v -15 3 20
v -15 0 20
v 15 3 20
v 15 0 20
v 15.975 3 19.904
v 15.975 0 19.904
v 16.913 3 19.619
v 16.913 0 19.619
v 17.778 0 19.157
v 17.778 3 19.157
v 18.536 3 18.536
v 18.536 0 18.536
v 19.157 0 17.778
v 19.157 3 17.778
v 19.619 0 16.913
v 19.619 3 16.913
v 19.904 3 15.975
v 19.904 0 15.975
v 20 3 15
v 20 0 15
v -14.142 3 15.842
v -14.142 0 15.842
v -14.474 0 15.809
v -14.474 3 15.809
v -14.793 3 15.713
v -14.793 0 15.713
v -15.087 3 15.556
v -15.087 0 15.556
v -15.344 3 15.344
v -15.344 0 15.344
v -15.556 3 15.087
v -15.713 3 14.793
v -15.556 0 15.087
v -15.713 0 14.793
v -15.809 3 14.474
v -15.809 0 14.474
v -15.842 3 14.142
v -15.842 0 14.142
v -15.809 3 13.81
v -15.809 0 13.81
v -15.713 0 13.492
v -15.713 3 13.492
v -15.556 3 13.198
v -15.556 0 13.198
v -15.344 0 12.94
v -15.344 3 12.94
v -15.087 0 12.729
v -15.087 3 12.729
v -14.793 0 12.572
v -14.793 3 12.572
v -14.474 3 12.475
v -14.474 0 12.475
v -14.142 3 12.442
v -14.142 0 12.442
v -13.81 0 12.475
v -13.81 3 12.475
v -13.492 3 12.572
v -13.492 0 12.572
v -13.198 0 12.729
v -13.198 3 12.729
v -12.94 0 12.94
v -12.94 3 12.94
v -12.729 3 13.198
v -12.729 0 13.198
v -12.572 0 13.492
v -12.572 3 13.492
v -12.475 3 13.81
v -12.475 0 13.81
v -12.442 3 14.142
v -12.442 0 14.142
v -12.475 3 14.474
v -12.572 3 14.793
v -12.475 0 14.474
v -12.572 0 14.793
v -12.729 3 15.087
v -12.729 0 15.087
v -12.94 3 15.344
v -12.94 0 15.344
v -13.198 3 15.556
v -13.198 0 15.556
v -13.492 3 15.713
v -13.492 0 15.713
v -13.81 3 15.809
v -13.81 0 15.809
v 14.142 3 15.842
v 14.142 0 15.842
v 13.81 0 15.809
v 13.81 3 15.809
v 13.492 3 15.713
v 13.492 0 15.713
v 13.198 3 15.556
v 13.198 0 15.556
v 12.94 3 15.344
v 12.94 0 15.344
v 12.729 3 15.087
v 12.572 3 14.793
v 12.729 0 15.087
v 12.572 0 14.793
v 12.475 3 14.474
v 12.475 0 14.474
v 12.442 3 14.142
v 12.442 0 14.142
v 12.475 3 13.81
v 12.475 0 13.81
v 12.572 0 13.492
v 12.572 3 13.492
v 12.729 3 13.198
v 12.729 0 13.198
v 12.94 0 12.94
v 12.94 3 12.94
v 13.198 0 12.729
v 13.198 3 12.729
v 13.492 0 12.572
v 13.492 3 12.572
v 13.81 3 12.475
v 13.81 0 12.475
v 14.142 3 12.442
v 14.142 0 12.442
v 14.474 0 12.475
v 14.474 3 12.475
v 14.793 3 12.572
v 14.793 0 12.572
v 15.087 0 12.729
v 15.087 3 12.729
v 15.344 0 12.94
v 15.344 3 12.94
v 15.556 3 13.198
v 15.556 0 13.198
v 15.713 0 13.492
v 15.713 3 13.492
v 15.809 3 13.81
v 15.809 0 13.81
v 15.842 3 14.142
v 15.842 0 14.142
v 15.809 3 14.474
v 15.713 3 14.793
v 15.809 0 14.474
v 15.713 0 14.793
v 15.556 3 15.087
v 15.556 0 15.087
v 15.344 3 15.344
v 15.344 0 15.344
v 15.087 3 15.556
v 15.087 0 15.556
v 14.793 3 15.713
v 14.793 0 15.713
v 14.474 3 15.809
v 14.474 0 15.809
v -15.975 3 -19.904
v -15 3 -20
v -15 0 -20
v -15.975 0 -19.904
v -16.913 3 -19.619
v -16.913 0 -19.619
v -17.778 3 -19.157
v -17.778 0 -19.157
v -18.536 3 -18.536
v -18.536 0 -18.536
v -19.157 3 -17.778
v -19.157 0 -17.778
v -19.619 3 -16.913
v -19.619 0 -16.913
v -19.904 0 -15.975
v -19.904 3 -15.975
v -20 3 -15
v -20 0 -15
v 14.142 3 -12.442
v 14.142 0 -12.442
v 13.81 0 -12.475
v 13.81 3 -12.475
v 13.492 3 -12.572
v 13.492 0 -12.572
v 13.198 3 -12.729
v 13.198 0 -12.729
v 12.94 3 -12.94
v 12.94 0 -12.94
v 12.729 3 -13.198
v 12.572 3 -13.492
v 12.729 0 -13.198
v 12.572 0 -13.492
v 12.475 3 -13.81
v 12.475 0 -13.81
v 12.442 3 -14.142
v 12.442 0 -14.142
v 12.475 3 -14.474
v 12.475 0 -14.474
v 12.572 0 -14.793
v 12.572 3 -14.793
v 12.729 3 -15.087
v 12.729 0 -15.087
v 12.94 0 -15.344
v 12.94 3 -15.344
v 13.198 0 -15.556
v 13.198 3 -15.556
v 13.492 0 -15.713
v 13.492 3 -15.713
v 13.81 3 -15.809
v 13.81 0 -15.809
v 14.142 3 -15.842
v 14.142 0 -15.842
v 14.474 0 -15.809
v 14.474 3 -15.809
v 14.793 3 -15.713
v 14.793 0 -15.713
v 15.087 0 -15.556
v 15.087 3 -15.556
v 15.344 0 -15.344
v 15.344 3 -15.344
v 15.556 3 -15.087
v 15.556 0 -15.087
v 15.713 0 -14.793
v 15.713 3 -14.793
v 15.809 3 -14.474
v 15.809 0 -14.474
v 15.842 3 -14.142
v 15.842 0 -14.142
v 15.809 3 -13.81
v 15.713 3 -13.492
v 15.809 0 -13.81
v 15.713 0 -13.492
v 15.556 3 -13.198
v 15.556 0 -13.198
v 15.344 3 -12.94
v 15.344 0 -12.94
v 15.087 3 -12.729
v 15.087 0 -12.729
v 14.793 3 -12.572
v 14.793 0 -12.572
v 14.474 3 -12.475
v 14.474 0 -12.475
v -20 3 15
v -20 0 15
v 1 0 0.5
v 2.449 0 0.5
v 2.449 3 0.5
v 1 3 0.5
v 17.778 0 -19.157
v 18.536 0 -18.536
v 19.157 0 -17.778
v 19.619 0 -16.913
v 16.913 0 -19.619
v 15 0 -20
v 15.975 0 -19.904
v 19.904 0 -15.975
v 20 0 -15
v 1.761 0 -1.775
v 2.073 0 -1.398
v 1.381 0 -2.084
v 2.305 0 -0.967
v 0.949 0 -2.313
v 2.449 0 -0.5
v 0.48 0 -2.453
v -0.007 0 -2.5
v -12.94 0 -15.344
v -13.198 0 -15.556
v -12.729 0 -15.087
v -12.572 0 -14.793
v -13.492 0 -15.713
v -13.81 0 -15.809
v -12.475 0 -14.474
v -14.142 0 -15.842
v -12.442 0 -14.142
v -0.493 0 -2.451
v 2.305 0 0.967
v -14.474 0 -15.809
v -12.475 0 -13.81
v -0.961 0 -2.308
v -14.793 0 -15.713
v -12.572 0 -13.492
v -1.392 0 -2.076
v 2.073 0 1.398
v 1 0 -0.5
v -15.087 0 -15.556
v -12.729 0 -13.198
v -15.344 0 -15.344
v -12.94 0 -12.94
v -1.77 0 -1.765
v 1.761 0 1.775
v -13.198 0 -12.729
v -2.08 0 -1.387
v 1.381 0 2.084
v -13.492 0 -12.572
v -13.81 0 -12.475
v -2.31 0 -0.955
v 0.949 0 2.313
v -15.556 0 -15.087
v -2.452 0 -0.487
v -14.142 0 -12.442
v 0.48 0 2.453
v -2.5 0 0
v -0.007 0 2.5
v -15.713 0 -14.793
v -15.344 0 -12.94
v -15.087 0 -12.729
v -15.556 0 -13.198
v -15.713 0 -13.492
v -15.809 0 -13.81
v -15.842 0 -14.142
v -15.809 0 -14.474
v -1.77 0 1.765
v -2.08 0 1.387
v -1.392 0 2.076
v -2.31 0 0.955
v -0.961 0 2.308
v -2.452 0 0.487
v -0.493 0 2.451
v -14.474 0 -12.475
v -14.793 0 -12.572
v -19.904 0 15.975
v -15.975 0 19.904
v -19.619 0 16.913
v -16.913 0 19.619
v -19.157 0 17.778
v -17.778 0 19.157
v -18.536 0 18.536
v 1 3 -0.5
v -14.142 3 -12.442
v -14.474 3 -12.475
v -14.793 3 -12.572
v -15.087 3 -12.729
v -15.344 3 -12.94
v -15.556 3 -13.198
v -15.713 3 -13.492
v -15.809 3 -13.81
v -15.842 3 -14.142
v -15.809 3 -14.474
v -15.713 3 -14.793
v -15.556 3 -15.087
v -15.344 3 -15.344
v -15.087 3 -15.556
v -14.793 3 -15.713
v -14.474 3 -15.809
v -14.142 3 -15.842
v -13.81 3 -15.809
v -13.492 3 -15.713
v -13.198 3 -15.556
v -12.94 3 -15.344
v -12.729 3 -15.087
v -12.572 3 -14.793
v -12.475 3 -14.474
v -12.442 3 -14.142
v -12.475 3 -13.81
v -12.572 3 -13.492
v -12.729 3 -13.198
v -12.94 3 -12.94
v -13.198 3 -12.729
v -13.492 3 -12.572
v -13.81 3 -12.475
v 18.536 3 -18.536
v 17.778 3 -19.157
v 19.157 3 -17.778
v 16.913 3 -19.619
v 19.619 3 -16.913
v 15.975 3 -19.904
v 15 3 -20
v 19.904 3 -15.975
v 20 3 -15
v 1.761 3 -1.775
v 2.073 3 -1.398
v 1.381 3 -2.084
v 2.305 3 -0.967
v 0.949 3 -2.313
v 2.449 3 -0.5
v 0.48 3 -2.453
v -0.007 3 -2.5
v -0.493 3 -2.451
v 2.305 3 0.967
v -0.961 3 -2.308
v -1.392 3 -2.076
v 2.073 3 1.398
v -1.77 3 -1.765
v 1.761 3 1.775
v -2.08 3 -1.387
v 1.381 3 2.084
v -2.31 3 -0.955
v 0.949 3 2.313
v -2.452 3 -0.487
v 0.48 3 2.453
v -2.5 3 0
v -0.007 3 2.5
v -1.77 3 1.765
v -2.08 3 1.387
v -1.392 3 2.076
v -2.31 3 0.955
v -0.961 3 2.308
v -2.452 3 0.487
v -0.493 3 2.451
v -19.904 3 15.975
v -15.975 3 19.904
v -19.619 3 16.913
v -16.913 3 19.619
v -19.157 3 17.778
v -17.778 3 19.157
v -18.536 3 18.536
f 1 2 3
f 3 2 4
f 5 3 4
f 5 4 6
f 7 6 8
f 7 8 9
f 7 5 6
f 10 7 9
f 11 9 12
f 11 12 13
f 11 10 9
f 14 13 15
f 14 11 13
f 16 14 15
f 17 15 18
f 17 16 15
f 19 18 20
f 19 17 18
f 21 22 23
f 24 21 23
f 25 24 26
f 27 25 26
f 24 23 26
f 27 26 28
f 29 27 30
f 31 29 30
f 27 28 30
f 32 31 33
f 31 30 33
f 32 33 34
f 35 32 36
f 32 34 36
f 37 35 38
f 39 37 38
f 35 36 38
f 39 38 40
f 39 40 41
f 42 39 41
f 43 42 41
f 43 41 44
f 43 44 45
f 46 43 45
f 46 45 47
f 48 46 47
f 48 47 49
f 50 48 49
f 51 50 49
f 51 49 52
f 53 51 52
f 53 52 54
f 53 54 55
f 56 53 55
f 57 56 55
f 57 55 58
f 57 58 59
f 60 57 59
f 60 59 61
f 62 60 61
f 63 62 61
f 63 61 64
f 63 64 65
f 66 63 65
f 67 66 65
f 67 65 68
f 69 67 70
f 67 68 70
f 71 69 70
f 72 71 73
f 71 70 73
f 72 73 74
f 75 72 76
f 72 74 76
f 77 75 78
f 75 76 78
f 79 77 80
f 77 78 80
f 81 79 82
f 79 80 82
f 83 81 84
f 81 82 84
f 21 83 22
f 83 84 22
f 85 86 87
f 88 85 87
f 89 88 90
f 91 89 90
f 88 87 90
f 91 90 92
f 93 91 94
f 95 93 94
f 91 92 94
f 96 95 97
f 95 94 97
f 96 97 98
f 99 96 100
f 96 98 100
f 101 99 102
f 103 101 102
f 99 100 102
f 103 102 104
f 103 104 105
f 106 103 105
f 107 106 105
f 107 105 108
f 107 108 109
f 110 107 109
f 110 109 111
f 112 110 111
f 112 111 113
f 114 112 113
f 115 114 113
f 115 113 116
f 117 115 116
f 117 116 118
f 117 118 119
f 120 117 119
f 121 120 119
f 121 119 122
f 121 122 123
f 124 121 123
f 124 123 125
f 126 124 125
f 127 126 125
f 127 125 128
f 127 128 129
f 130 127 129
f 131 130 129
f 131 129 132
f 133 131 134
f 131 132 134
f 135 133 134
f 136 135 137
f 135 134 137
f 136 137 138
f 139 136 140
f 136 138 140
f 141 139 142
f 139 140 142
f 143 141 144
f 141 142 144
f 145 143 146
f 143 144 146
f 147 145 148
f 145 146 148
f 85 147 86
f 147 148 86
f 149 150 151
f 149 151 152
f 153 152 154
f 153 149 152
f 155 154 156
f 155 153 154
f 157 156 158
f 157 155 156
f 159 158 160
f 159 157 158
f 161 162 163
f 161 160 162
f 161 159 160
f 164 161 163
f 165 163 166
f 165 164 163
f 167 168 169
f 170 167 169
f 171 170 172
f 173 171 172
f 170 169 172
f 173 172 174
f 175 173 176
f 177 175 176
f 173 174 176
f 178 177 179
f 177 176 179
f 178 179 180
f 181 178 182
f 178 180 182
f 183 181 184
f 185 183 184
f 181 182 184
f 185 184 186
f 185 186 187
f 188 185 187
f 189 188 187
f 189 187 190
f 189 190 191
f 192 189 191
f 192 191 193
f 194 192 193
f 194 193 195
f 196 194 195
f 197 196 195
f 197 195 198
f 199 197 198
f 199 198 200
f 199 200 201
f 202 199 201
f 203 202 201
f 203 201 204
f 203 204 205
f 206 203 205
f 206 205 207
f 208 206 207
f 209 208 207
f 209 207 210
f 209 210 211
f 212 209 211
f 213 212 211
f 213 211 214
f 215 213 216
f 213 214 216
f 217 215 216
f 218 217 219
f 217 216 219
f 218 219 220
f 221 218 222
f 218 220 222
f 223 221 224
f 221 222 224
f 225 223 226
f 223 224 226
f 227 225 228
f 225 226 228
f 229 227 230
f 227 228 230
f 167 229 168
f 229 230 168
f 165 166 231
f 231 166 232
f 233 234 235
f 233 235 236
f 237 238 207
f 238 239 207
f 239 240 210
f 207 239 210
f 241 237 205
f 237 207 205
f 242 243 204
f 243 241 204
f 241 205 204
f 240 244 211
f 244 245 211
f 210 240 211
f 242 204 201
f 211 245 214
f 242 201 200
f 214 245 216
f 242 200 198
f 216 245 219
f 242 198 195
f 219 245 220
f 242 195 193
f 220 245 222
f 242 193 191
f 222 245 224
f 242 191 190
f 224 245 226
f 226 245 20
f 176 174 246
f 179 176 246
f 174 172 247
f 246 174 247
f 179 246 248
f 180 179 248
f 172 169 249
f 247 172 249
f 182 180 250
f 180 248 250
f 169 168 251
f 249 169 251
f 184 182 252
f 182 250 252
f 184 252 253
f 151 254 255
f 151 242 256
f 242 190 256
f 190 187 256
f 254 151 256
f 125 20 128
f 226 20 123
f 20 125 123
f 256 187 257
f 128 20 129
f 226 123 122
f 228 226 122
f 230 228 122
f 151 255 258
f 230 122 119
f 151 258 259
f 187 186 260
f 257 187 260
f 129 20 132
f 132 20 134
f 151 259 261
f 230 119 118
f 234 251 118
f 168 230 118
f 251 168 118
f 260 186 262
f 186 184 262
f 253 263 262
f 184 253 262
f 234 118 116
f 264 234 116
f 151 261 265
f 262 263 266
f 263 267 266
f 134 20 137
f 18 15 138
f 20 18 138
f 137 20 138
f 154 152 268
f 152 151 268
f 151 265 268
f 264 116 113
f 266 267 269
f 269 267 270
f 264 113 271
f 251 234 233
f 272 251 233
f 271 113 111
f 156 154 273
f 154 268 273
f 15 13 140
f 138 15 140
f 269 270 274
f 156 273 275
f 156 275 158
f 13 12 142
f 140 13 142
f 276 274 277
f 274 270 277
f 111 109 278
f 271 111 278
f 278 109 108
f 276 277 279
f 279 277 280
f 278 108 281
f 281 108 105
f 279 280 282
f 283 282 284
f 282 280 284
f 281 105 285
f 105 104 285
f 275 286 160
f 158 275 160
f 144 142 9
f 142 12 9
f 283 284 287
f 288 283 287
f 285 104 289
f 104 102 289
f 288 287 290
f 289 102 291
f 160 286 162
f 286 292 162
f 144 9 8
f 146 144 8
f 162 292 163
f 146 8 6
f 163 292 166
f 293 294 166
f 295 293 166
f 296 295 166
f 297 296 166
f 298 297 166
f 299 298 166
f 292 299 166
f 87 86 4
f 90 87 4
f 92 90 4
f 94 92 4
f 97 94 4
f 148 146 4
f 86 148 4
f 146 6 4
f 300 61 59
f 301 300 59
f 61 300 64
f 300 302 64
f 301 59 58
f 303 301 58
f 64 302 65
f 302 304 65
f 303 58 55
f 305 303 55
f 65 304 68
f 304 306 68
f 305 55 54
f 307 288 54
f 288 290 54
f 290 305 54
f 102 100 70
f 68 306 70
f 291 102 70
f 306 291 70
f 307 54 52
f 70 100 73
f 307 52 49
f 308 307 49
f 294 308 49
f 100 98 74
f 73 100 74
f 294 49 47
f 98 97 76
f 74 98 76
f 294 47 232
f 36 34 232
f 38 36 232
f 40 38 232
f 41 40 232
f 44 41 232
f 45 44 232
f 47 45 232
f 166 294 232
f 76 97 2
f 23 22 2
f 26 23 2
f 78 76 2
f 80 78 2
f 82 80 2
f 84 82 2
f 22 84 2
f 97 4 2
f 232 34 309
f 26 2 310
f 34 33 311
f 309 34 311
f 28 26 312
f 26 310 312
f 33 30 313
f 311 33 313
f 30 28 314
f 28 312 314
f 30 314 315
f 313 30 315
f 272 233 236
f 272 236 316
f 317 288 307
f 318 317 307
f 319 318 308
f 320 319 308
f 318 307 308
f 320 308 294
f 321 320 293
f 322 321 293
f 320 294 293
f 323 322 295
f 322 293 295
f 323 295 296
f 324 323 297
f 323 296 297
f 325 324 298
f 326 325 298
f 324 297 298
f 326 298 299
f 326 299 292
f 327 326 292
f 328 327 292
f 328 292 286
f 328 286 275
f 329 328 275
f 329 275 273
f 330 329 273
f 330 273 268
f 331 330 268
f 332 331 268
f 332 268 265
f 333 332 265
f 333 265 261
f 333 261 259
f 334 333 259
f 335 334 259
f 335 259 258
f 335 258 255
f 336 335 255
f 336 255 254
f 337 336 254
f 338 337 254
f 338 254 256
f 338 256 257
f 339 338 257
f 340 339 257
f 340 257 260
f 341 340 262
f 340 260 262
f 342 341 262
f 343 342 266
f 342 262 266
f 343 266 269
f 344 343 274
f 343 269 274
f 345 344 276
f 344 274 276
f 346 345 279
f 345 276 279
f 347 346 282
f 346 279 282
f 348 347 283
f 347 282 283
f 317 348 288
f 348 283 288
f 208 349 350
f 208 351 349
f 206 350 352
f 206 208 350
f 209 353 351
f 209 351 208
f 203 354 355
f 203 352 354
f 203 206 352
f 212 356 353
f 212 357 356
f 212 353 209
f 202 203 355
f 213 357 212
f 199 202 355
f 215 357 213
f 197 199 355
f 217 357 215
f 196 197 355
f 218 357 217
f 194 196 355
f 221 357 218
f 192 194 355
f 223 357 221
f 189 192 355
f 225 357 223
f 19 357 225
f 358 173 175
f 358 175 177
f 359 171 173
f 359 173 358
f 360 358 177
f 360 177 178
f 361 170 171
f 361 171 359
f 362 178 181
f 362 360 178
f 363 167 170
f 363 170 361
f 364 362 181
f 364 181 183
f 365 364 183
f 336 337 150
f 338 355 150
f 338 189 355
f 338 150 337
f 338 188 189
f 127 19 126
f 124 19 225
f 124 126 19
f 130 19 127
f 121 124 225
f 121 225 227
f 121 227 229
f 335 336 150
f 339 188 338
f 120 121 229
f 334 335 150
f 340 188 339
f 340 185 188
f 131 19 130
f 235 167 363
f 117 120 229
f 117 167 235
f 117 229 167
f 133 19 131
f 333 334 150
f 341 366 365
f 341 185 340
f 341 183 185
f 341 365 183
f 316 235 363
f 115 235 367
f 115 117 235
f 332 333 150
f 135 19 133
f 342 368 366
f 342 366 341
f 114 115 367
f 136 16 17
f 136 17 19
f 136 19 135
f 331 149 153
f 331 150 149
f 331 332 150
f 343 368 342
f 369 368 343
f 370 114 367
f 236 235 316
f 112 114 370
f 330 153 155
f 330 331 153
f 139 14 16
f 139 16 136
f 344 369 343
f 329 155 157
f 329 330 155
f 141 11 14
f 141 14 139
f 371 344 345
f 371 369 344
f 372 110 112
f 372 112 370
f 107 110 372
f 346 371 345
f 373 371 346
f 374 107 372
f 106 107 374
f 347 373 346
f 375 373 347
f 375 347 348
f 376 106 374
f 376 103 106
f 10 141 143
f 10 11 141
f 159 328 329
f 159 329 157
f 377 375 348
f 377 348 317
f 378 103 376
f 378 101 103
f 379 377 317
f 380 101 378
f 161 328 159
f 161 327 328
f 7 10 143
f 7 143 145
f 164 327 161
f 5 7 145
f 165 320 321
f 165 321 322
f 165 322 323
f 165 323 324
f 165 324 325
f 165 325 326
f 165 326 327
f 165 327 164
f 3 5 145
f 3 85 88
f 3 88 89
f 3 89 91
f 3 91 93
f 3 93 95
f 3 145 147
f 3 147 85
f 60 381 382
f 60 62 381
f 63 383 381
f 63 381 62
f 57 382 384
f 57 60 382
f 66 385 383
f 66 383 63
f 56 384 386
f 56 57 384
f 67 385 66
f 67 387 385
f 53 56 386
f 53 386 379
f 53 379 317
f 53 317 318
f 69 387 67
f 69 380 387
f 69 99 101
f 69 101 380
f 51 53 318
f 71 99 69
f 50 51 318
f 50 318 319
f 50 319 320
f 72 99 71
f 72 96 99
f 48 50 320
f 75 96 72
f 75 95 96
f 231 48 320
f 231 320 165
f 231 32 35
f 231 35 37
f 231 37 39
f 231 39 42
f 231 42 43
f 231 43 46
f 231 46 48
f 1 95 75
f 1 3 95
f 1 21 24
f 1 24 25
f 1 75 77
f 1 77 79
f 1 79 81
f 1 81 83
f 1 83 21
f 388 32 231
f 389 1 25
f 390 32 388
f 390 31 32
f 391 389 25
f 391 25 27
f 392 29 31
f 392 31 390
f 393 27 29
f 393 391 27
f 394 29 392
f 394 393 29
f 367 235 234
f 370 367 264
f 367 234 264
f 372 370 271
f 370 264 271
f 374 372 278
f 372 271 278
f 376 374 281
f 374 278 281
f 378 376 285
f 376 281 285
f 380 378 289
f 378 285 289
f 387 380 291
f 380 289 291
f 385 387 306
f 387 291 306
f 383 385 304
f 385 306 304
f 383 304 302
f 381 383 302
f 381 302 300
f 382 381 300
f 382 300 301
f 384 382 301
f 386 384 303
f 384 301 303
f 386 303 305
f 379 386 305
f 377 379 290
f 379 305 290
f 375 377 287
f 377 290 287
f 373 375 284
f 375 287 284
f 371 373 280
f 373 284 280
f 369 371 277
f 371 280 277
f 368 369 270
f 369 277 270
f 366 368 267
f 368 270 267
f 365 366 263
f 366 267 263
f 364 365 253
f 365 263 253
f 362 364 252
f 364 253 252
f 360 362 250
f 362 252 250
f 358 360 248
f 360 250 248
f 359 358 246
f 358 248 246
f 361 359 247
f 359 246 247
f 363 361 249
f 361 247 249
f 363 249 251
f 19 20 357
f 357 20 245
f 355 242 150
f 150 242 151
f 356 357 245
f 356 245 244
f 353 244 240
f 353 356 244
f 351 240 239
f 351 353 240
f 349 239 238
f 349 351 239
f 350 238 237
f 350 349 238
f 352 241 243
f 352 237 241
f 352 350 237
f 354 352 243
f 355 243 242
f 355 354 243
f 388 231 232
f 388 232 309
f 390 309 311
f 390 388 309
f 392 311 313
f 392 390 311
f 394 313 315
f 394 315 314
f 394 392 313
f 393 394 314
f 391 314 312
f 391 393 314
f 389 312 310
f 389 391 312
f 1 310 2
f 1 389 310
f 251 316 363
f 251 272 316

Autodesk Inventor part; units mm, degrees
ref_plane "YZ Plane" through (0, 0, 0) normal (1, 0, 0) x (0, 1, 0)
ref_plane "XZ Plane" through (0, 0, 0) normal (0, 1, 0) x (-1, 0, 0)
ref_plane "XY Plane" through (0, 0, 0) normal (0, 0, 1) x (1, 0, 0)
sketch "Sketch1" plane through (0, 0, 0) normal (0, 1, 0) x (-1, 0, 0)
  circle A0 centre (0, 0) radius 14.5 construction
  circle A1 centre (0, 0) radius 2.5
  line L0 (-4, 0.5) -> (-1, 0.5)
  line L1 (-1, 0.5) -> (-1, -0.5)
  line L2 (-1, -0.5) -> (-4, -0.5)
  line L3 (-4, -0.5) -> (-4, 0.5)
  line L4 (-4, 0.5) -> (-1, -0.5) construction
  line L5 (-1, 0.5) -> (-4, -0.5) construction
  line L6 (20, 20) -> (-20, 20)
  line L7 (-20, 20) -> (-20, -20)
  line L8 (-20, -20) -> (20, -20)
  line L9 (20, -20) -> (20, 20)
  line L10 (20, 20) -> (-20, -20) construction
  line L11 (-20, 20) -> (20, -20) construction
  point P0 (-2.5, 0)
  point P1 (-2.4495, 0.5)
  point P2 (-2.4495, -0.5)
  dimension "d1" = 5
  dimension "d0" = 29
  dimension "d2" = 1
  dimension "d3" = 1
  dimension "d6" = 40
  dimension "d7" = 40
extrude "Extrusion1" add sketch "Sketch1" along normal blind 3 contours L0 L1 L2 A1 | A1 L2 L3 L0 | L9 L8 L7 L6 picked at (-1.4981, -0.0559)
sketch "Sketch2" plane through (0, 3, 0) normal (0, 1, 0) x (1, 0, 0)
  arc A0 (2.4495, 0.5) -> (2.4495, -0.5) centre (0, 0) ccw projected
  line L0 (-20, 20) -> (-20, -20) projected
  circle A1 centre (0, 0) radius 20 construction
  line L1 (-20, -20) -> (0, 0) construction
  point P0 (-14.1421, -14.1421)
  point P1 (14.1421, -14.1421)
  point P2 (14.1421, 14.1421)
  point P3 (-14.1421, 14.1421)
  dimension "d8" = 40
  dimension "d11" = 360
hole "Hole1" at (-14.1421, 3, 14.1421) at (14.1421, 3, 14.1421) at (14.1421, 3, -14.1421) at (-14.1421, 3, -14.1421) direction (0, -1, 0) diameter 3.4 end through all clearance for "Socket Head Cap Screw ISO 4762" size "M3" standard "ISO"
fillet "Fillet1" radius 5 4 edges at (-20, 1.5, 20) (-20, 1.5, -20) (20, 1.5, -20) (20, 1.5, 20)
equation "\"d7\" = d6"
properties part number "rod allingment"
